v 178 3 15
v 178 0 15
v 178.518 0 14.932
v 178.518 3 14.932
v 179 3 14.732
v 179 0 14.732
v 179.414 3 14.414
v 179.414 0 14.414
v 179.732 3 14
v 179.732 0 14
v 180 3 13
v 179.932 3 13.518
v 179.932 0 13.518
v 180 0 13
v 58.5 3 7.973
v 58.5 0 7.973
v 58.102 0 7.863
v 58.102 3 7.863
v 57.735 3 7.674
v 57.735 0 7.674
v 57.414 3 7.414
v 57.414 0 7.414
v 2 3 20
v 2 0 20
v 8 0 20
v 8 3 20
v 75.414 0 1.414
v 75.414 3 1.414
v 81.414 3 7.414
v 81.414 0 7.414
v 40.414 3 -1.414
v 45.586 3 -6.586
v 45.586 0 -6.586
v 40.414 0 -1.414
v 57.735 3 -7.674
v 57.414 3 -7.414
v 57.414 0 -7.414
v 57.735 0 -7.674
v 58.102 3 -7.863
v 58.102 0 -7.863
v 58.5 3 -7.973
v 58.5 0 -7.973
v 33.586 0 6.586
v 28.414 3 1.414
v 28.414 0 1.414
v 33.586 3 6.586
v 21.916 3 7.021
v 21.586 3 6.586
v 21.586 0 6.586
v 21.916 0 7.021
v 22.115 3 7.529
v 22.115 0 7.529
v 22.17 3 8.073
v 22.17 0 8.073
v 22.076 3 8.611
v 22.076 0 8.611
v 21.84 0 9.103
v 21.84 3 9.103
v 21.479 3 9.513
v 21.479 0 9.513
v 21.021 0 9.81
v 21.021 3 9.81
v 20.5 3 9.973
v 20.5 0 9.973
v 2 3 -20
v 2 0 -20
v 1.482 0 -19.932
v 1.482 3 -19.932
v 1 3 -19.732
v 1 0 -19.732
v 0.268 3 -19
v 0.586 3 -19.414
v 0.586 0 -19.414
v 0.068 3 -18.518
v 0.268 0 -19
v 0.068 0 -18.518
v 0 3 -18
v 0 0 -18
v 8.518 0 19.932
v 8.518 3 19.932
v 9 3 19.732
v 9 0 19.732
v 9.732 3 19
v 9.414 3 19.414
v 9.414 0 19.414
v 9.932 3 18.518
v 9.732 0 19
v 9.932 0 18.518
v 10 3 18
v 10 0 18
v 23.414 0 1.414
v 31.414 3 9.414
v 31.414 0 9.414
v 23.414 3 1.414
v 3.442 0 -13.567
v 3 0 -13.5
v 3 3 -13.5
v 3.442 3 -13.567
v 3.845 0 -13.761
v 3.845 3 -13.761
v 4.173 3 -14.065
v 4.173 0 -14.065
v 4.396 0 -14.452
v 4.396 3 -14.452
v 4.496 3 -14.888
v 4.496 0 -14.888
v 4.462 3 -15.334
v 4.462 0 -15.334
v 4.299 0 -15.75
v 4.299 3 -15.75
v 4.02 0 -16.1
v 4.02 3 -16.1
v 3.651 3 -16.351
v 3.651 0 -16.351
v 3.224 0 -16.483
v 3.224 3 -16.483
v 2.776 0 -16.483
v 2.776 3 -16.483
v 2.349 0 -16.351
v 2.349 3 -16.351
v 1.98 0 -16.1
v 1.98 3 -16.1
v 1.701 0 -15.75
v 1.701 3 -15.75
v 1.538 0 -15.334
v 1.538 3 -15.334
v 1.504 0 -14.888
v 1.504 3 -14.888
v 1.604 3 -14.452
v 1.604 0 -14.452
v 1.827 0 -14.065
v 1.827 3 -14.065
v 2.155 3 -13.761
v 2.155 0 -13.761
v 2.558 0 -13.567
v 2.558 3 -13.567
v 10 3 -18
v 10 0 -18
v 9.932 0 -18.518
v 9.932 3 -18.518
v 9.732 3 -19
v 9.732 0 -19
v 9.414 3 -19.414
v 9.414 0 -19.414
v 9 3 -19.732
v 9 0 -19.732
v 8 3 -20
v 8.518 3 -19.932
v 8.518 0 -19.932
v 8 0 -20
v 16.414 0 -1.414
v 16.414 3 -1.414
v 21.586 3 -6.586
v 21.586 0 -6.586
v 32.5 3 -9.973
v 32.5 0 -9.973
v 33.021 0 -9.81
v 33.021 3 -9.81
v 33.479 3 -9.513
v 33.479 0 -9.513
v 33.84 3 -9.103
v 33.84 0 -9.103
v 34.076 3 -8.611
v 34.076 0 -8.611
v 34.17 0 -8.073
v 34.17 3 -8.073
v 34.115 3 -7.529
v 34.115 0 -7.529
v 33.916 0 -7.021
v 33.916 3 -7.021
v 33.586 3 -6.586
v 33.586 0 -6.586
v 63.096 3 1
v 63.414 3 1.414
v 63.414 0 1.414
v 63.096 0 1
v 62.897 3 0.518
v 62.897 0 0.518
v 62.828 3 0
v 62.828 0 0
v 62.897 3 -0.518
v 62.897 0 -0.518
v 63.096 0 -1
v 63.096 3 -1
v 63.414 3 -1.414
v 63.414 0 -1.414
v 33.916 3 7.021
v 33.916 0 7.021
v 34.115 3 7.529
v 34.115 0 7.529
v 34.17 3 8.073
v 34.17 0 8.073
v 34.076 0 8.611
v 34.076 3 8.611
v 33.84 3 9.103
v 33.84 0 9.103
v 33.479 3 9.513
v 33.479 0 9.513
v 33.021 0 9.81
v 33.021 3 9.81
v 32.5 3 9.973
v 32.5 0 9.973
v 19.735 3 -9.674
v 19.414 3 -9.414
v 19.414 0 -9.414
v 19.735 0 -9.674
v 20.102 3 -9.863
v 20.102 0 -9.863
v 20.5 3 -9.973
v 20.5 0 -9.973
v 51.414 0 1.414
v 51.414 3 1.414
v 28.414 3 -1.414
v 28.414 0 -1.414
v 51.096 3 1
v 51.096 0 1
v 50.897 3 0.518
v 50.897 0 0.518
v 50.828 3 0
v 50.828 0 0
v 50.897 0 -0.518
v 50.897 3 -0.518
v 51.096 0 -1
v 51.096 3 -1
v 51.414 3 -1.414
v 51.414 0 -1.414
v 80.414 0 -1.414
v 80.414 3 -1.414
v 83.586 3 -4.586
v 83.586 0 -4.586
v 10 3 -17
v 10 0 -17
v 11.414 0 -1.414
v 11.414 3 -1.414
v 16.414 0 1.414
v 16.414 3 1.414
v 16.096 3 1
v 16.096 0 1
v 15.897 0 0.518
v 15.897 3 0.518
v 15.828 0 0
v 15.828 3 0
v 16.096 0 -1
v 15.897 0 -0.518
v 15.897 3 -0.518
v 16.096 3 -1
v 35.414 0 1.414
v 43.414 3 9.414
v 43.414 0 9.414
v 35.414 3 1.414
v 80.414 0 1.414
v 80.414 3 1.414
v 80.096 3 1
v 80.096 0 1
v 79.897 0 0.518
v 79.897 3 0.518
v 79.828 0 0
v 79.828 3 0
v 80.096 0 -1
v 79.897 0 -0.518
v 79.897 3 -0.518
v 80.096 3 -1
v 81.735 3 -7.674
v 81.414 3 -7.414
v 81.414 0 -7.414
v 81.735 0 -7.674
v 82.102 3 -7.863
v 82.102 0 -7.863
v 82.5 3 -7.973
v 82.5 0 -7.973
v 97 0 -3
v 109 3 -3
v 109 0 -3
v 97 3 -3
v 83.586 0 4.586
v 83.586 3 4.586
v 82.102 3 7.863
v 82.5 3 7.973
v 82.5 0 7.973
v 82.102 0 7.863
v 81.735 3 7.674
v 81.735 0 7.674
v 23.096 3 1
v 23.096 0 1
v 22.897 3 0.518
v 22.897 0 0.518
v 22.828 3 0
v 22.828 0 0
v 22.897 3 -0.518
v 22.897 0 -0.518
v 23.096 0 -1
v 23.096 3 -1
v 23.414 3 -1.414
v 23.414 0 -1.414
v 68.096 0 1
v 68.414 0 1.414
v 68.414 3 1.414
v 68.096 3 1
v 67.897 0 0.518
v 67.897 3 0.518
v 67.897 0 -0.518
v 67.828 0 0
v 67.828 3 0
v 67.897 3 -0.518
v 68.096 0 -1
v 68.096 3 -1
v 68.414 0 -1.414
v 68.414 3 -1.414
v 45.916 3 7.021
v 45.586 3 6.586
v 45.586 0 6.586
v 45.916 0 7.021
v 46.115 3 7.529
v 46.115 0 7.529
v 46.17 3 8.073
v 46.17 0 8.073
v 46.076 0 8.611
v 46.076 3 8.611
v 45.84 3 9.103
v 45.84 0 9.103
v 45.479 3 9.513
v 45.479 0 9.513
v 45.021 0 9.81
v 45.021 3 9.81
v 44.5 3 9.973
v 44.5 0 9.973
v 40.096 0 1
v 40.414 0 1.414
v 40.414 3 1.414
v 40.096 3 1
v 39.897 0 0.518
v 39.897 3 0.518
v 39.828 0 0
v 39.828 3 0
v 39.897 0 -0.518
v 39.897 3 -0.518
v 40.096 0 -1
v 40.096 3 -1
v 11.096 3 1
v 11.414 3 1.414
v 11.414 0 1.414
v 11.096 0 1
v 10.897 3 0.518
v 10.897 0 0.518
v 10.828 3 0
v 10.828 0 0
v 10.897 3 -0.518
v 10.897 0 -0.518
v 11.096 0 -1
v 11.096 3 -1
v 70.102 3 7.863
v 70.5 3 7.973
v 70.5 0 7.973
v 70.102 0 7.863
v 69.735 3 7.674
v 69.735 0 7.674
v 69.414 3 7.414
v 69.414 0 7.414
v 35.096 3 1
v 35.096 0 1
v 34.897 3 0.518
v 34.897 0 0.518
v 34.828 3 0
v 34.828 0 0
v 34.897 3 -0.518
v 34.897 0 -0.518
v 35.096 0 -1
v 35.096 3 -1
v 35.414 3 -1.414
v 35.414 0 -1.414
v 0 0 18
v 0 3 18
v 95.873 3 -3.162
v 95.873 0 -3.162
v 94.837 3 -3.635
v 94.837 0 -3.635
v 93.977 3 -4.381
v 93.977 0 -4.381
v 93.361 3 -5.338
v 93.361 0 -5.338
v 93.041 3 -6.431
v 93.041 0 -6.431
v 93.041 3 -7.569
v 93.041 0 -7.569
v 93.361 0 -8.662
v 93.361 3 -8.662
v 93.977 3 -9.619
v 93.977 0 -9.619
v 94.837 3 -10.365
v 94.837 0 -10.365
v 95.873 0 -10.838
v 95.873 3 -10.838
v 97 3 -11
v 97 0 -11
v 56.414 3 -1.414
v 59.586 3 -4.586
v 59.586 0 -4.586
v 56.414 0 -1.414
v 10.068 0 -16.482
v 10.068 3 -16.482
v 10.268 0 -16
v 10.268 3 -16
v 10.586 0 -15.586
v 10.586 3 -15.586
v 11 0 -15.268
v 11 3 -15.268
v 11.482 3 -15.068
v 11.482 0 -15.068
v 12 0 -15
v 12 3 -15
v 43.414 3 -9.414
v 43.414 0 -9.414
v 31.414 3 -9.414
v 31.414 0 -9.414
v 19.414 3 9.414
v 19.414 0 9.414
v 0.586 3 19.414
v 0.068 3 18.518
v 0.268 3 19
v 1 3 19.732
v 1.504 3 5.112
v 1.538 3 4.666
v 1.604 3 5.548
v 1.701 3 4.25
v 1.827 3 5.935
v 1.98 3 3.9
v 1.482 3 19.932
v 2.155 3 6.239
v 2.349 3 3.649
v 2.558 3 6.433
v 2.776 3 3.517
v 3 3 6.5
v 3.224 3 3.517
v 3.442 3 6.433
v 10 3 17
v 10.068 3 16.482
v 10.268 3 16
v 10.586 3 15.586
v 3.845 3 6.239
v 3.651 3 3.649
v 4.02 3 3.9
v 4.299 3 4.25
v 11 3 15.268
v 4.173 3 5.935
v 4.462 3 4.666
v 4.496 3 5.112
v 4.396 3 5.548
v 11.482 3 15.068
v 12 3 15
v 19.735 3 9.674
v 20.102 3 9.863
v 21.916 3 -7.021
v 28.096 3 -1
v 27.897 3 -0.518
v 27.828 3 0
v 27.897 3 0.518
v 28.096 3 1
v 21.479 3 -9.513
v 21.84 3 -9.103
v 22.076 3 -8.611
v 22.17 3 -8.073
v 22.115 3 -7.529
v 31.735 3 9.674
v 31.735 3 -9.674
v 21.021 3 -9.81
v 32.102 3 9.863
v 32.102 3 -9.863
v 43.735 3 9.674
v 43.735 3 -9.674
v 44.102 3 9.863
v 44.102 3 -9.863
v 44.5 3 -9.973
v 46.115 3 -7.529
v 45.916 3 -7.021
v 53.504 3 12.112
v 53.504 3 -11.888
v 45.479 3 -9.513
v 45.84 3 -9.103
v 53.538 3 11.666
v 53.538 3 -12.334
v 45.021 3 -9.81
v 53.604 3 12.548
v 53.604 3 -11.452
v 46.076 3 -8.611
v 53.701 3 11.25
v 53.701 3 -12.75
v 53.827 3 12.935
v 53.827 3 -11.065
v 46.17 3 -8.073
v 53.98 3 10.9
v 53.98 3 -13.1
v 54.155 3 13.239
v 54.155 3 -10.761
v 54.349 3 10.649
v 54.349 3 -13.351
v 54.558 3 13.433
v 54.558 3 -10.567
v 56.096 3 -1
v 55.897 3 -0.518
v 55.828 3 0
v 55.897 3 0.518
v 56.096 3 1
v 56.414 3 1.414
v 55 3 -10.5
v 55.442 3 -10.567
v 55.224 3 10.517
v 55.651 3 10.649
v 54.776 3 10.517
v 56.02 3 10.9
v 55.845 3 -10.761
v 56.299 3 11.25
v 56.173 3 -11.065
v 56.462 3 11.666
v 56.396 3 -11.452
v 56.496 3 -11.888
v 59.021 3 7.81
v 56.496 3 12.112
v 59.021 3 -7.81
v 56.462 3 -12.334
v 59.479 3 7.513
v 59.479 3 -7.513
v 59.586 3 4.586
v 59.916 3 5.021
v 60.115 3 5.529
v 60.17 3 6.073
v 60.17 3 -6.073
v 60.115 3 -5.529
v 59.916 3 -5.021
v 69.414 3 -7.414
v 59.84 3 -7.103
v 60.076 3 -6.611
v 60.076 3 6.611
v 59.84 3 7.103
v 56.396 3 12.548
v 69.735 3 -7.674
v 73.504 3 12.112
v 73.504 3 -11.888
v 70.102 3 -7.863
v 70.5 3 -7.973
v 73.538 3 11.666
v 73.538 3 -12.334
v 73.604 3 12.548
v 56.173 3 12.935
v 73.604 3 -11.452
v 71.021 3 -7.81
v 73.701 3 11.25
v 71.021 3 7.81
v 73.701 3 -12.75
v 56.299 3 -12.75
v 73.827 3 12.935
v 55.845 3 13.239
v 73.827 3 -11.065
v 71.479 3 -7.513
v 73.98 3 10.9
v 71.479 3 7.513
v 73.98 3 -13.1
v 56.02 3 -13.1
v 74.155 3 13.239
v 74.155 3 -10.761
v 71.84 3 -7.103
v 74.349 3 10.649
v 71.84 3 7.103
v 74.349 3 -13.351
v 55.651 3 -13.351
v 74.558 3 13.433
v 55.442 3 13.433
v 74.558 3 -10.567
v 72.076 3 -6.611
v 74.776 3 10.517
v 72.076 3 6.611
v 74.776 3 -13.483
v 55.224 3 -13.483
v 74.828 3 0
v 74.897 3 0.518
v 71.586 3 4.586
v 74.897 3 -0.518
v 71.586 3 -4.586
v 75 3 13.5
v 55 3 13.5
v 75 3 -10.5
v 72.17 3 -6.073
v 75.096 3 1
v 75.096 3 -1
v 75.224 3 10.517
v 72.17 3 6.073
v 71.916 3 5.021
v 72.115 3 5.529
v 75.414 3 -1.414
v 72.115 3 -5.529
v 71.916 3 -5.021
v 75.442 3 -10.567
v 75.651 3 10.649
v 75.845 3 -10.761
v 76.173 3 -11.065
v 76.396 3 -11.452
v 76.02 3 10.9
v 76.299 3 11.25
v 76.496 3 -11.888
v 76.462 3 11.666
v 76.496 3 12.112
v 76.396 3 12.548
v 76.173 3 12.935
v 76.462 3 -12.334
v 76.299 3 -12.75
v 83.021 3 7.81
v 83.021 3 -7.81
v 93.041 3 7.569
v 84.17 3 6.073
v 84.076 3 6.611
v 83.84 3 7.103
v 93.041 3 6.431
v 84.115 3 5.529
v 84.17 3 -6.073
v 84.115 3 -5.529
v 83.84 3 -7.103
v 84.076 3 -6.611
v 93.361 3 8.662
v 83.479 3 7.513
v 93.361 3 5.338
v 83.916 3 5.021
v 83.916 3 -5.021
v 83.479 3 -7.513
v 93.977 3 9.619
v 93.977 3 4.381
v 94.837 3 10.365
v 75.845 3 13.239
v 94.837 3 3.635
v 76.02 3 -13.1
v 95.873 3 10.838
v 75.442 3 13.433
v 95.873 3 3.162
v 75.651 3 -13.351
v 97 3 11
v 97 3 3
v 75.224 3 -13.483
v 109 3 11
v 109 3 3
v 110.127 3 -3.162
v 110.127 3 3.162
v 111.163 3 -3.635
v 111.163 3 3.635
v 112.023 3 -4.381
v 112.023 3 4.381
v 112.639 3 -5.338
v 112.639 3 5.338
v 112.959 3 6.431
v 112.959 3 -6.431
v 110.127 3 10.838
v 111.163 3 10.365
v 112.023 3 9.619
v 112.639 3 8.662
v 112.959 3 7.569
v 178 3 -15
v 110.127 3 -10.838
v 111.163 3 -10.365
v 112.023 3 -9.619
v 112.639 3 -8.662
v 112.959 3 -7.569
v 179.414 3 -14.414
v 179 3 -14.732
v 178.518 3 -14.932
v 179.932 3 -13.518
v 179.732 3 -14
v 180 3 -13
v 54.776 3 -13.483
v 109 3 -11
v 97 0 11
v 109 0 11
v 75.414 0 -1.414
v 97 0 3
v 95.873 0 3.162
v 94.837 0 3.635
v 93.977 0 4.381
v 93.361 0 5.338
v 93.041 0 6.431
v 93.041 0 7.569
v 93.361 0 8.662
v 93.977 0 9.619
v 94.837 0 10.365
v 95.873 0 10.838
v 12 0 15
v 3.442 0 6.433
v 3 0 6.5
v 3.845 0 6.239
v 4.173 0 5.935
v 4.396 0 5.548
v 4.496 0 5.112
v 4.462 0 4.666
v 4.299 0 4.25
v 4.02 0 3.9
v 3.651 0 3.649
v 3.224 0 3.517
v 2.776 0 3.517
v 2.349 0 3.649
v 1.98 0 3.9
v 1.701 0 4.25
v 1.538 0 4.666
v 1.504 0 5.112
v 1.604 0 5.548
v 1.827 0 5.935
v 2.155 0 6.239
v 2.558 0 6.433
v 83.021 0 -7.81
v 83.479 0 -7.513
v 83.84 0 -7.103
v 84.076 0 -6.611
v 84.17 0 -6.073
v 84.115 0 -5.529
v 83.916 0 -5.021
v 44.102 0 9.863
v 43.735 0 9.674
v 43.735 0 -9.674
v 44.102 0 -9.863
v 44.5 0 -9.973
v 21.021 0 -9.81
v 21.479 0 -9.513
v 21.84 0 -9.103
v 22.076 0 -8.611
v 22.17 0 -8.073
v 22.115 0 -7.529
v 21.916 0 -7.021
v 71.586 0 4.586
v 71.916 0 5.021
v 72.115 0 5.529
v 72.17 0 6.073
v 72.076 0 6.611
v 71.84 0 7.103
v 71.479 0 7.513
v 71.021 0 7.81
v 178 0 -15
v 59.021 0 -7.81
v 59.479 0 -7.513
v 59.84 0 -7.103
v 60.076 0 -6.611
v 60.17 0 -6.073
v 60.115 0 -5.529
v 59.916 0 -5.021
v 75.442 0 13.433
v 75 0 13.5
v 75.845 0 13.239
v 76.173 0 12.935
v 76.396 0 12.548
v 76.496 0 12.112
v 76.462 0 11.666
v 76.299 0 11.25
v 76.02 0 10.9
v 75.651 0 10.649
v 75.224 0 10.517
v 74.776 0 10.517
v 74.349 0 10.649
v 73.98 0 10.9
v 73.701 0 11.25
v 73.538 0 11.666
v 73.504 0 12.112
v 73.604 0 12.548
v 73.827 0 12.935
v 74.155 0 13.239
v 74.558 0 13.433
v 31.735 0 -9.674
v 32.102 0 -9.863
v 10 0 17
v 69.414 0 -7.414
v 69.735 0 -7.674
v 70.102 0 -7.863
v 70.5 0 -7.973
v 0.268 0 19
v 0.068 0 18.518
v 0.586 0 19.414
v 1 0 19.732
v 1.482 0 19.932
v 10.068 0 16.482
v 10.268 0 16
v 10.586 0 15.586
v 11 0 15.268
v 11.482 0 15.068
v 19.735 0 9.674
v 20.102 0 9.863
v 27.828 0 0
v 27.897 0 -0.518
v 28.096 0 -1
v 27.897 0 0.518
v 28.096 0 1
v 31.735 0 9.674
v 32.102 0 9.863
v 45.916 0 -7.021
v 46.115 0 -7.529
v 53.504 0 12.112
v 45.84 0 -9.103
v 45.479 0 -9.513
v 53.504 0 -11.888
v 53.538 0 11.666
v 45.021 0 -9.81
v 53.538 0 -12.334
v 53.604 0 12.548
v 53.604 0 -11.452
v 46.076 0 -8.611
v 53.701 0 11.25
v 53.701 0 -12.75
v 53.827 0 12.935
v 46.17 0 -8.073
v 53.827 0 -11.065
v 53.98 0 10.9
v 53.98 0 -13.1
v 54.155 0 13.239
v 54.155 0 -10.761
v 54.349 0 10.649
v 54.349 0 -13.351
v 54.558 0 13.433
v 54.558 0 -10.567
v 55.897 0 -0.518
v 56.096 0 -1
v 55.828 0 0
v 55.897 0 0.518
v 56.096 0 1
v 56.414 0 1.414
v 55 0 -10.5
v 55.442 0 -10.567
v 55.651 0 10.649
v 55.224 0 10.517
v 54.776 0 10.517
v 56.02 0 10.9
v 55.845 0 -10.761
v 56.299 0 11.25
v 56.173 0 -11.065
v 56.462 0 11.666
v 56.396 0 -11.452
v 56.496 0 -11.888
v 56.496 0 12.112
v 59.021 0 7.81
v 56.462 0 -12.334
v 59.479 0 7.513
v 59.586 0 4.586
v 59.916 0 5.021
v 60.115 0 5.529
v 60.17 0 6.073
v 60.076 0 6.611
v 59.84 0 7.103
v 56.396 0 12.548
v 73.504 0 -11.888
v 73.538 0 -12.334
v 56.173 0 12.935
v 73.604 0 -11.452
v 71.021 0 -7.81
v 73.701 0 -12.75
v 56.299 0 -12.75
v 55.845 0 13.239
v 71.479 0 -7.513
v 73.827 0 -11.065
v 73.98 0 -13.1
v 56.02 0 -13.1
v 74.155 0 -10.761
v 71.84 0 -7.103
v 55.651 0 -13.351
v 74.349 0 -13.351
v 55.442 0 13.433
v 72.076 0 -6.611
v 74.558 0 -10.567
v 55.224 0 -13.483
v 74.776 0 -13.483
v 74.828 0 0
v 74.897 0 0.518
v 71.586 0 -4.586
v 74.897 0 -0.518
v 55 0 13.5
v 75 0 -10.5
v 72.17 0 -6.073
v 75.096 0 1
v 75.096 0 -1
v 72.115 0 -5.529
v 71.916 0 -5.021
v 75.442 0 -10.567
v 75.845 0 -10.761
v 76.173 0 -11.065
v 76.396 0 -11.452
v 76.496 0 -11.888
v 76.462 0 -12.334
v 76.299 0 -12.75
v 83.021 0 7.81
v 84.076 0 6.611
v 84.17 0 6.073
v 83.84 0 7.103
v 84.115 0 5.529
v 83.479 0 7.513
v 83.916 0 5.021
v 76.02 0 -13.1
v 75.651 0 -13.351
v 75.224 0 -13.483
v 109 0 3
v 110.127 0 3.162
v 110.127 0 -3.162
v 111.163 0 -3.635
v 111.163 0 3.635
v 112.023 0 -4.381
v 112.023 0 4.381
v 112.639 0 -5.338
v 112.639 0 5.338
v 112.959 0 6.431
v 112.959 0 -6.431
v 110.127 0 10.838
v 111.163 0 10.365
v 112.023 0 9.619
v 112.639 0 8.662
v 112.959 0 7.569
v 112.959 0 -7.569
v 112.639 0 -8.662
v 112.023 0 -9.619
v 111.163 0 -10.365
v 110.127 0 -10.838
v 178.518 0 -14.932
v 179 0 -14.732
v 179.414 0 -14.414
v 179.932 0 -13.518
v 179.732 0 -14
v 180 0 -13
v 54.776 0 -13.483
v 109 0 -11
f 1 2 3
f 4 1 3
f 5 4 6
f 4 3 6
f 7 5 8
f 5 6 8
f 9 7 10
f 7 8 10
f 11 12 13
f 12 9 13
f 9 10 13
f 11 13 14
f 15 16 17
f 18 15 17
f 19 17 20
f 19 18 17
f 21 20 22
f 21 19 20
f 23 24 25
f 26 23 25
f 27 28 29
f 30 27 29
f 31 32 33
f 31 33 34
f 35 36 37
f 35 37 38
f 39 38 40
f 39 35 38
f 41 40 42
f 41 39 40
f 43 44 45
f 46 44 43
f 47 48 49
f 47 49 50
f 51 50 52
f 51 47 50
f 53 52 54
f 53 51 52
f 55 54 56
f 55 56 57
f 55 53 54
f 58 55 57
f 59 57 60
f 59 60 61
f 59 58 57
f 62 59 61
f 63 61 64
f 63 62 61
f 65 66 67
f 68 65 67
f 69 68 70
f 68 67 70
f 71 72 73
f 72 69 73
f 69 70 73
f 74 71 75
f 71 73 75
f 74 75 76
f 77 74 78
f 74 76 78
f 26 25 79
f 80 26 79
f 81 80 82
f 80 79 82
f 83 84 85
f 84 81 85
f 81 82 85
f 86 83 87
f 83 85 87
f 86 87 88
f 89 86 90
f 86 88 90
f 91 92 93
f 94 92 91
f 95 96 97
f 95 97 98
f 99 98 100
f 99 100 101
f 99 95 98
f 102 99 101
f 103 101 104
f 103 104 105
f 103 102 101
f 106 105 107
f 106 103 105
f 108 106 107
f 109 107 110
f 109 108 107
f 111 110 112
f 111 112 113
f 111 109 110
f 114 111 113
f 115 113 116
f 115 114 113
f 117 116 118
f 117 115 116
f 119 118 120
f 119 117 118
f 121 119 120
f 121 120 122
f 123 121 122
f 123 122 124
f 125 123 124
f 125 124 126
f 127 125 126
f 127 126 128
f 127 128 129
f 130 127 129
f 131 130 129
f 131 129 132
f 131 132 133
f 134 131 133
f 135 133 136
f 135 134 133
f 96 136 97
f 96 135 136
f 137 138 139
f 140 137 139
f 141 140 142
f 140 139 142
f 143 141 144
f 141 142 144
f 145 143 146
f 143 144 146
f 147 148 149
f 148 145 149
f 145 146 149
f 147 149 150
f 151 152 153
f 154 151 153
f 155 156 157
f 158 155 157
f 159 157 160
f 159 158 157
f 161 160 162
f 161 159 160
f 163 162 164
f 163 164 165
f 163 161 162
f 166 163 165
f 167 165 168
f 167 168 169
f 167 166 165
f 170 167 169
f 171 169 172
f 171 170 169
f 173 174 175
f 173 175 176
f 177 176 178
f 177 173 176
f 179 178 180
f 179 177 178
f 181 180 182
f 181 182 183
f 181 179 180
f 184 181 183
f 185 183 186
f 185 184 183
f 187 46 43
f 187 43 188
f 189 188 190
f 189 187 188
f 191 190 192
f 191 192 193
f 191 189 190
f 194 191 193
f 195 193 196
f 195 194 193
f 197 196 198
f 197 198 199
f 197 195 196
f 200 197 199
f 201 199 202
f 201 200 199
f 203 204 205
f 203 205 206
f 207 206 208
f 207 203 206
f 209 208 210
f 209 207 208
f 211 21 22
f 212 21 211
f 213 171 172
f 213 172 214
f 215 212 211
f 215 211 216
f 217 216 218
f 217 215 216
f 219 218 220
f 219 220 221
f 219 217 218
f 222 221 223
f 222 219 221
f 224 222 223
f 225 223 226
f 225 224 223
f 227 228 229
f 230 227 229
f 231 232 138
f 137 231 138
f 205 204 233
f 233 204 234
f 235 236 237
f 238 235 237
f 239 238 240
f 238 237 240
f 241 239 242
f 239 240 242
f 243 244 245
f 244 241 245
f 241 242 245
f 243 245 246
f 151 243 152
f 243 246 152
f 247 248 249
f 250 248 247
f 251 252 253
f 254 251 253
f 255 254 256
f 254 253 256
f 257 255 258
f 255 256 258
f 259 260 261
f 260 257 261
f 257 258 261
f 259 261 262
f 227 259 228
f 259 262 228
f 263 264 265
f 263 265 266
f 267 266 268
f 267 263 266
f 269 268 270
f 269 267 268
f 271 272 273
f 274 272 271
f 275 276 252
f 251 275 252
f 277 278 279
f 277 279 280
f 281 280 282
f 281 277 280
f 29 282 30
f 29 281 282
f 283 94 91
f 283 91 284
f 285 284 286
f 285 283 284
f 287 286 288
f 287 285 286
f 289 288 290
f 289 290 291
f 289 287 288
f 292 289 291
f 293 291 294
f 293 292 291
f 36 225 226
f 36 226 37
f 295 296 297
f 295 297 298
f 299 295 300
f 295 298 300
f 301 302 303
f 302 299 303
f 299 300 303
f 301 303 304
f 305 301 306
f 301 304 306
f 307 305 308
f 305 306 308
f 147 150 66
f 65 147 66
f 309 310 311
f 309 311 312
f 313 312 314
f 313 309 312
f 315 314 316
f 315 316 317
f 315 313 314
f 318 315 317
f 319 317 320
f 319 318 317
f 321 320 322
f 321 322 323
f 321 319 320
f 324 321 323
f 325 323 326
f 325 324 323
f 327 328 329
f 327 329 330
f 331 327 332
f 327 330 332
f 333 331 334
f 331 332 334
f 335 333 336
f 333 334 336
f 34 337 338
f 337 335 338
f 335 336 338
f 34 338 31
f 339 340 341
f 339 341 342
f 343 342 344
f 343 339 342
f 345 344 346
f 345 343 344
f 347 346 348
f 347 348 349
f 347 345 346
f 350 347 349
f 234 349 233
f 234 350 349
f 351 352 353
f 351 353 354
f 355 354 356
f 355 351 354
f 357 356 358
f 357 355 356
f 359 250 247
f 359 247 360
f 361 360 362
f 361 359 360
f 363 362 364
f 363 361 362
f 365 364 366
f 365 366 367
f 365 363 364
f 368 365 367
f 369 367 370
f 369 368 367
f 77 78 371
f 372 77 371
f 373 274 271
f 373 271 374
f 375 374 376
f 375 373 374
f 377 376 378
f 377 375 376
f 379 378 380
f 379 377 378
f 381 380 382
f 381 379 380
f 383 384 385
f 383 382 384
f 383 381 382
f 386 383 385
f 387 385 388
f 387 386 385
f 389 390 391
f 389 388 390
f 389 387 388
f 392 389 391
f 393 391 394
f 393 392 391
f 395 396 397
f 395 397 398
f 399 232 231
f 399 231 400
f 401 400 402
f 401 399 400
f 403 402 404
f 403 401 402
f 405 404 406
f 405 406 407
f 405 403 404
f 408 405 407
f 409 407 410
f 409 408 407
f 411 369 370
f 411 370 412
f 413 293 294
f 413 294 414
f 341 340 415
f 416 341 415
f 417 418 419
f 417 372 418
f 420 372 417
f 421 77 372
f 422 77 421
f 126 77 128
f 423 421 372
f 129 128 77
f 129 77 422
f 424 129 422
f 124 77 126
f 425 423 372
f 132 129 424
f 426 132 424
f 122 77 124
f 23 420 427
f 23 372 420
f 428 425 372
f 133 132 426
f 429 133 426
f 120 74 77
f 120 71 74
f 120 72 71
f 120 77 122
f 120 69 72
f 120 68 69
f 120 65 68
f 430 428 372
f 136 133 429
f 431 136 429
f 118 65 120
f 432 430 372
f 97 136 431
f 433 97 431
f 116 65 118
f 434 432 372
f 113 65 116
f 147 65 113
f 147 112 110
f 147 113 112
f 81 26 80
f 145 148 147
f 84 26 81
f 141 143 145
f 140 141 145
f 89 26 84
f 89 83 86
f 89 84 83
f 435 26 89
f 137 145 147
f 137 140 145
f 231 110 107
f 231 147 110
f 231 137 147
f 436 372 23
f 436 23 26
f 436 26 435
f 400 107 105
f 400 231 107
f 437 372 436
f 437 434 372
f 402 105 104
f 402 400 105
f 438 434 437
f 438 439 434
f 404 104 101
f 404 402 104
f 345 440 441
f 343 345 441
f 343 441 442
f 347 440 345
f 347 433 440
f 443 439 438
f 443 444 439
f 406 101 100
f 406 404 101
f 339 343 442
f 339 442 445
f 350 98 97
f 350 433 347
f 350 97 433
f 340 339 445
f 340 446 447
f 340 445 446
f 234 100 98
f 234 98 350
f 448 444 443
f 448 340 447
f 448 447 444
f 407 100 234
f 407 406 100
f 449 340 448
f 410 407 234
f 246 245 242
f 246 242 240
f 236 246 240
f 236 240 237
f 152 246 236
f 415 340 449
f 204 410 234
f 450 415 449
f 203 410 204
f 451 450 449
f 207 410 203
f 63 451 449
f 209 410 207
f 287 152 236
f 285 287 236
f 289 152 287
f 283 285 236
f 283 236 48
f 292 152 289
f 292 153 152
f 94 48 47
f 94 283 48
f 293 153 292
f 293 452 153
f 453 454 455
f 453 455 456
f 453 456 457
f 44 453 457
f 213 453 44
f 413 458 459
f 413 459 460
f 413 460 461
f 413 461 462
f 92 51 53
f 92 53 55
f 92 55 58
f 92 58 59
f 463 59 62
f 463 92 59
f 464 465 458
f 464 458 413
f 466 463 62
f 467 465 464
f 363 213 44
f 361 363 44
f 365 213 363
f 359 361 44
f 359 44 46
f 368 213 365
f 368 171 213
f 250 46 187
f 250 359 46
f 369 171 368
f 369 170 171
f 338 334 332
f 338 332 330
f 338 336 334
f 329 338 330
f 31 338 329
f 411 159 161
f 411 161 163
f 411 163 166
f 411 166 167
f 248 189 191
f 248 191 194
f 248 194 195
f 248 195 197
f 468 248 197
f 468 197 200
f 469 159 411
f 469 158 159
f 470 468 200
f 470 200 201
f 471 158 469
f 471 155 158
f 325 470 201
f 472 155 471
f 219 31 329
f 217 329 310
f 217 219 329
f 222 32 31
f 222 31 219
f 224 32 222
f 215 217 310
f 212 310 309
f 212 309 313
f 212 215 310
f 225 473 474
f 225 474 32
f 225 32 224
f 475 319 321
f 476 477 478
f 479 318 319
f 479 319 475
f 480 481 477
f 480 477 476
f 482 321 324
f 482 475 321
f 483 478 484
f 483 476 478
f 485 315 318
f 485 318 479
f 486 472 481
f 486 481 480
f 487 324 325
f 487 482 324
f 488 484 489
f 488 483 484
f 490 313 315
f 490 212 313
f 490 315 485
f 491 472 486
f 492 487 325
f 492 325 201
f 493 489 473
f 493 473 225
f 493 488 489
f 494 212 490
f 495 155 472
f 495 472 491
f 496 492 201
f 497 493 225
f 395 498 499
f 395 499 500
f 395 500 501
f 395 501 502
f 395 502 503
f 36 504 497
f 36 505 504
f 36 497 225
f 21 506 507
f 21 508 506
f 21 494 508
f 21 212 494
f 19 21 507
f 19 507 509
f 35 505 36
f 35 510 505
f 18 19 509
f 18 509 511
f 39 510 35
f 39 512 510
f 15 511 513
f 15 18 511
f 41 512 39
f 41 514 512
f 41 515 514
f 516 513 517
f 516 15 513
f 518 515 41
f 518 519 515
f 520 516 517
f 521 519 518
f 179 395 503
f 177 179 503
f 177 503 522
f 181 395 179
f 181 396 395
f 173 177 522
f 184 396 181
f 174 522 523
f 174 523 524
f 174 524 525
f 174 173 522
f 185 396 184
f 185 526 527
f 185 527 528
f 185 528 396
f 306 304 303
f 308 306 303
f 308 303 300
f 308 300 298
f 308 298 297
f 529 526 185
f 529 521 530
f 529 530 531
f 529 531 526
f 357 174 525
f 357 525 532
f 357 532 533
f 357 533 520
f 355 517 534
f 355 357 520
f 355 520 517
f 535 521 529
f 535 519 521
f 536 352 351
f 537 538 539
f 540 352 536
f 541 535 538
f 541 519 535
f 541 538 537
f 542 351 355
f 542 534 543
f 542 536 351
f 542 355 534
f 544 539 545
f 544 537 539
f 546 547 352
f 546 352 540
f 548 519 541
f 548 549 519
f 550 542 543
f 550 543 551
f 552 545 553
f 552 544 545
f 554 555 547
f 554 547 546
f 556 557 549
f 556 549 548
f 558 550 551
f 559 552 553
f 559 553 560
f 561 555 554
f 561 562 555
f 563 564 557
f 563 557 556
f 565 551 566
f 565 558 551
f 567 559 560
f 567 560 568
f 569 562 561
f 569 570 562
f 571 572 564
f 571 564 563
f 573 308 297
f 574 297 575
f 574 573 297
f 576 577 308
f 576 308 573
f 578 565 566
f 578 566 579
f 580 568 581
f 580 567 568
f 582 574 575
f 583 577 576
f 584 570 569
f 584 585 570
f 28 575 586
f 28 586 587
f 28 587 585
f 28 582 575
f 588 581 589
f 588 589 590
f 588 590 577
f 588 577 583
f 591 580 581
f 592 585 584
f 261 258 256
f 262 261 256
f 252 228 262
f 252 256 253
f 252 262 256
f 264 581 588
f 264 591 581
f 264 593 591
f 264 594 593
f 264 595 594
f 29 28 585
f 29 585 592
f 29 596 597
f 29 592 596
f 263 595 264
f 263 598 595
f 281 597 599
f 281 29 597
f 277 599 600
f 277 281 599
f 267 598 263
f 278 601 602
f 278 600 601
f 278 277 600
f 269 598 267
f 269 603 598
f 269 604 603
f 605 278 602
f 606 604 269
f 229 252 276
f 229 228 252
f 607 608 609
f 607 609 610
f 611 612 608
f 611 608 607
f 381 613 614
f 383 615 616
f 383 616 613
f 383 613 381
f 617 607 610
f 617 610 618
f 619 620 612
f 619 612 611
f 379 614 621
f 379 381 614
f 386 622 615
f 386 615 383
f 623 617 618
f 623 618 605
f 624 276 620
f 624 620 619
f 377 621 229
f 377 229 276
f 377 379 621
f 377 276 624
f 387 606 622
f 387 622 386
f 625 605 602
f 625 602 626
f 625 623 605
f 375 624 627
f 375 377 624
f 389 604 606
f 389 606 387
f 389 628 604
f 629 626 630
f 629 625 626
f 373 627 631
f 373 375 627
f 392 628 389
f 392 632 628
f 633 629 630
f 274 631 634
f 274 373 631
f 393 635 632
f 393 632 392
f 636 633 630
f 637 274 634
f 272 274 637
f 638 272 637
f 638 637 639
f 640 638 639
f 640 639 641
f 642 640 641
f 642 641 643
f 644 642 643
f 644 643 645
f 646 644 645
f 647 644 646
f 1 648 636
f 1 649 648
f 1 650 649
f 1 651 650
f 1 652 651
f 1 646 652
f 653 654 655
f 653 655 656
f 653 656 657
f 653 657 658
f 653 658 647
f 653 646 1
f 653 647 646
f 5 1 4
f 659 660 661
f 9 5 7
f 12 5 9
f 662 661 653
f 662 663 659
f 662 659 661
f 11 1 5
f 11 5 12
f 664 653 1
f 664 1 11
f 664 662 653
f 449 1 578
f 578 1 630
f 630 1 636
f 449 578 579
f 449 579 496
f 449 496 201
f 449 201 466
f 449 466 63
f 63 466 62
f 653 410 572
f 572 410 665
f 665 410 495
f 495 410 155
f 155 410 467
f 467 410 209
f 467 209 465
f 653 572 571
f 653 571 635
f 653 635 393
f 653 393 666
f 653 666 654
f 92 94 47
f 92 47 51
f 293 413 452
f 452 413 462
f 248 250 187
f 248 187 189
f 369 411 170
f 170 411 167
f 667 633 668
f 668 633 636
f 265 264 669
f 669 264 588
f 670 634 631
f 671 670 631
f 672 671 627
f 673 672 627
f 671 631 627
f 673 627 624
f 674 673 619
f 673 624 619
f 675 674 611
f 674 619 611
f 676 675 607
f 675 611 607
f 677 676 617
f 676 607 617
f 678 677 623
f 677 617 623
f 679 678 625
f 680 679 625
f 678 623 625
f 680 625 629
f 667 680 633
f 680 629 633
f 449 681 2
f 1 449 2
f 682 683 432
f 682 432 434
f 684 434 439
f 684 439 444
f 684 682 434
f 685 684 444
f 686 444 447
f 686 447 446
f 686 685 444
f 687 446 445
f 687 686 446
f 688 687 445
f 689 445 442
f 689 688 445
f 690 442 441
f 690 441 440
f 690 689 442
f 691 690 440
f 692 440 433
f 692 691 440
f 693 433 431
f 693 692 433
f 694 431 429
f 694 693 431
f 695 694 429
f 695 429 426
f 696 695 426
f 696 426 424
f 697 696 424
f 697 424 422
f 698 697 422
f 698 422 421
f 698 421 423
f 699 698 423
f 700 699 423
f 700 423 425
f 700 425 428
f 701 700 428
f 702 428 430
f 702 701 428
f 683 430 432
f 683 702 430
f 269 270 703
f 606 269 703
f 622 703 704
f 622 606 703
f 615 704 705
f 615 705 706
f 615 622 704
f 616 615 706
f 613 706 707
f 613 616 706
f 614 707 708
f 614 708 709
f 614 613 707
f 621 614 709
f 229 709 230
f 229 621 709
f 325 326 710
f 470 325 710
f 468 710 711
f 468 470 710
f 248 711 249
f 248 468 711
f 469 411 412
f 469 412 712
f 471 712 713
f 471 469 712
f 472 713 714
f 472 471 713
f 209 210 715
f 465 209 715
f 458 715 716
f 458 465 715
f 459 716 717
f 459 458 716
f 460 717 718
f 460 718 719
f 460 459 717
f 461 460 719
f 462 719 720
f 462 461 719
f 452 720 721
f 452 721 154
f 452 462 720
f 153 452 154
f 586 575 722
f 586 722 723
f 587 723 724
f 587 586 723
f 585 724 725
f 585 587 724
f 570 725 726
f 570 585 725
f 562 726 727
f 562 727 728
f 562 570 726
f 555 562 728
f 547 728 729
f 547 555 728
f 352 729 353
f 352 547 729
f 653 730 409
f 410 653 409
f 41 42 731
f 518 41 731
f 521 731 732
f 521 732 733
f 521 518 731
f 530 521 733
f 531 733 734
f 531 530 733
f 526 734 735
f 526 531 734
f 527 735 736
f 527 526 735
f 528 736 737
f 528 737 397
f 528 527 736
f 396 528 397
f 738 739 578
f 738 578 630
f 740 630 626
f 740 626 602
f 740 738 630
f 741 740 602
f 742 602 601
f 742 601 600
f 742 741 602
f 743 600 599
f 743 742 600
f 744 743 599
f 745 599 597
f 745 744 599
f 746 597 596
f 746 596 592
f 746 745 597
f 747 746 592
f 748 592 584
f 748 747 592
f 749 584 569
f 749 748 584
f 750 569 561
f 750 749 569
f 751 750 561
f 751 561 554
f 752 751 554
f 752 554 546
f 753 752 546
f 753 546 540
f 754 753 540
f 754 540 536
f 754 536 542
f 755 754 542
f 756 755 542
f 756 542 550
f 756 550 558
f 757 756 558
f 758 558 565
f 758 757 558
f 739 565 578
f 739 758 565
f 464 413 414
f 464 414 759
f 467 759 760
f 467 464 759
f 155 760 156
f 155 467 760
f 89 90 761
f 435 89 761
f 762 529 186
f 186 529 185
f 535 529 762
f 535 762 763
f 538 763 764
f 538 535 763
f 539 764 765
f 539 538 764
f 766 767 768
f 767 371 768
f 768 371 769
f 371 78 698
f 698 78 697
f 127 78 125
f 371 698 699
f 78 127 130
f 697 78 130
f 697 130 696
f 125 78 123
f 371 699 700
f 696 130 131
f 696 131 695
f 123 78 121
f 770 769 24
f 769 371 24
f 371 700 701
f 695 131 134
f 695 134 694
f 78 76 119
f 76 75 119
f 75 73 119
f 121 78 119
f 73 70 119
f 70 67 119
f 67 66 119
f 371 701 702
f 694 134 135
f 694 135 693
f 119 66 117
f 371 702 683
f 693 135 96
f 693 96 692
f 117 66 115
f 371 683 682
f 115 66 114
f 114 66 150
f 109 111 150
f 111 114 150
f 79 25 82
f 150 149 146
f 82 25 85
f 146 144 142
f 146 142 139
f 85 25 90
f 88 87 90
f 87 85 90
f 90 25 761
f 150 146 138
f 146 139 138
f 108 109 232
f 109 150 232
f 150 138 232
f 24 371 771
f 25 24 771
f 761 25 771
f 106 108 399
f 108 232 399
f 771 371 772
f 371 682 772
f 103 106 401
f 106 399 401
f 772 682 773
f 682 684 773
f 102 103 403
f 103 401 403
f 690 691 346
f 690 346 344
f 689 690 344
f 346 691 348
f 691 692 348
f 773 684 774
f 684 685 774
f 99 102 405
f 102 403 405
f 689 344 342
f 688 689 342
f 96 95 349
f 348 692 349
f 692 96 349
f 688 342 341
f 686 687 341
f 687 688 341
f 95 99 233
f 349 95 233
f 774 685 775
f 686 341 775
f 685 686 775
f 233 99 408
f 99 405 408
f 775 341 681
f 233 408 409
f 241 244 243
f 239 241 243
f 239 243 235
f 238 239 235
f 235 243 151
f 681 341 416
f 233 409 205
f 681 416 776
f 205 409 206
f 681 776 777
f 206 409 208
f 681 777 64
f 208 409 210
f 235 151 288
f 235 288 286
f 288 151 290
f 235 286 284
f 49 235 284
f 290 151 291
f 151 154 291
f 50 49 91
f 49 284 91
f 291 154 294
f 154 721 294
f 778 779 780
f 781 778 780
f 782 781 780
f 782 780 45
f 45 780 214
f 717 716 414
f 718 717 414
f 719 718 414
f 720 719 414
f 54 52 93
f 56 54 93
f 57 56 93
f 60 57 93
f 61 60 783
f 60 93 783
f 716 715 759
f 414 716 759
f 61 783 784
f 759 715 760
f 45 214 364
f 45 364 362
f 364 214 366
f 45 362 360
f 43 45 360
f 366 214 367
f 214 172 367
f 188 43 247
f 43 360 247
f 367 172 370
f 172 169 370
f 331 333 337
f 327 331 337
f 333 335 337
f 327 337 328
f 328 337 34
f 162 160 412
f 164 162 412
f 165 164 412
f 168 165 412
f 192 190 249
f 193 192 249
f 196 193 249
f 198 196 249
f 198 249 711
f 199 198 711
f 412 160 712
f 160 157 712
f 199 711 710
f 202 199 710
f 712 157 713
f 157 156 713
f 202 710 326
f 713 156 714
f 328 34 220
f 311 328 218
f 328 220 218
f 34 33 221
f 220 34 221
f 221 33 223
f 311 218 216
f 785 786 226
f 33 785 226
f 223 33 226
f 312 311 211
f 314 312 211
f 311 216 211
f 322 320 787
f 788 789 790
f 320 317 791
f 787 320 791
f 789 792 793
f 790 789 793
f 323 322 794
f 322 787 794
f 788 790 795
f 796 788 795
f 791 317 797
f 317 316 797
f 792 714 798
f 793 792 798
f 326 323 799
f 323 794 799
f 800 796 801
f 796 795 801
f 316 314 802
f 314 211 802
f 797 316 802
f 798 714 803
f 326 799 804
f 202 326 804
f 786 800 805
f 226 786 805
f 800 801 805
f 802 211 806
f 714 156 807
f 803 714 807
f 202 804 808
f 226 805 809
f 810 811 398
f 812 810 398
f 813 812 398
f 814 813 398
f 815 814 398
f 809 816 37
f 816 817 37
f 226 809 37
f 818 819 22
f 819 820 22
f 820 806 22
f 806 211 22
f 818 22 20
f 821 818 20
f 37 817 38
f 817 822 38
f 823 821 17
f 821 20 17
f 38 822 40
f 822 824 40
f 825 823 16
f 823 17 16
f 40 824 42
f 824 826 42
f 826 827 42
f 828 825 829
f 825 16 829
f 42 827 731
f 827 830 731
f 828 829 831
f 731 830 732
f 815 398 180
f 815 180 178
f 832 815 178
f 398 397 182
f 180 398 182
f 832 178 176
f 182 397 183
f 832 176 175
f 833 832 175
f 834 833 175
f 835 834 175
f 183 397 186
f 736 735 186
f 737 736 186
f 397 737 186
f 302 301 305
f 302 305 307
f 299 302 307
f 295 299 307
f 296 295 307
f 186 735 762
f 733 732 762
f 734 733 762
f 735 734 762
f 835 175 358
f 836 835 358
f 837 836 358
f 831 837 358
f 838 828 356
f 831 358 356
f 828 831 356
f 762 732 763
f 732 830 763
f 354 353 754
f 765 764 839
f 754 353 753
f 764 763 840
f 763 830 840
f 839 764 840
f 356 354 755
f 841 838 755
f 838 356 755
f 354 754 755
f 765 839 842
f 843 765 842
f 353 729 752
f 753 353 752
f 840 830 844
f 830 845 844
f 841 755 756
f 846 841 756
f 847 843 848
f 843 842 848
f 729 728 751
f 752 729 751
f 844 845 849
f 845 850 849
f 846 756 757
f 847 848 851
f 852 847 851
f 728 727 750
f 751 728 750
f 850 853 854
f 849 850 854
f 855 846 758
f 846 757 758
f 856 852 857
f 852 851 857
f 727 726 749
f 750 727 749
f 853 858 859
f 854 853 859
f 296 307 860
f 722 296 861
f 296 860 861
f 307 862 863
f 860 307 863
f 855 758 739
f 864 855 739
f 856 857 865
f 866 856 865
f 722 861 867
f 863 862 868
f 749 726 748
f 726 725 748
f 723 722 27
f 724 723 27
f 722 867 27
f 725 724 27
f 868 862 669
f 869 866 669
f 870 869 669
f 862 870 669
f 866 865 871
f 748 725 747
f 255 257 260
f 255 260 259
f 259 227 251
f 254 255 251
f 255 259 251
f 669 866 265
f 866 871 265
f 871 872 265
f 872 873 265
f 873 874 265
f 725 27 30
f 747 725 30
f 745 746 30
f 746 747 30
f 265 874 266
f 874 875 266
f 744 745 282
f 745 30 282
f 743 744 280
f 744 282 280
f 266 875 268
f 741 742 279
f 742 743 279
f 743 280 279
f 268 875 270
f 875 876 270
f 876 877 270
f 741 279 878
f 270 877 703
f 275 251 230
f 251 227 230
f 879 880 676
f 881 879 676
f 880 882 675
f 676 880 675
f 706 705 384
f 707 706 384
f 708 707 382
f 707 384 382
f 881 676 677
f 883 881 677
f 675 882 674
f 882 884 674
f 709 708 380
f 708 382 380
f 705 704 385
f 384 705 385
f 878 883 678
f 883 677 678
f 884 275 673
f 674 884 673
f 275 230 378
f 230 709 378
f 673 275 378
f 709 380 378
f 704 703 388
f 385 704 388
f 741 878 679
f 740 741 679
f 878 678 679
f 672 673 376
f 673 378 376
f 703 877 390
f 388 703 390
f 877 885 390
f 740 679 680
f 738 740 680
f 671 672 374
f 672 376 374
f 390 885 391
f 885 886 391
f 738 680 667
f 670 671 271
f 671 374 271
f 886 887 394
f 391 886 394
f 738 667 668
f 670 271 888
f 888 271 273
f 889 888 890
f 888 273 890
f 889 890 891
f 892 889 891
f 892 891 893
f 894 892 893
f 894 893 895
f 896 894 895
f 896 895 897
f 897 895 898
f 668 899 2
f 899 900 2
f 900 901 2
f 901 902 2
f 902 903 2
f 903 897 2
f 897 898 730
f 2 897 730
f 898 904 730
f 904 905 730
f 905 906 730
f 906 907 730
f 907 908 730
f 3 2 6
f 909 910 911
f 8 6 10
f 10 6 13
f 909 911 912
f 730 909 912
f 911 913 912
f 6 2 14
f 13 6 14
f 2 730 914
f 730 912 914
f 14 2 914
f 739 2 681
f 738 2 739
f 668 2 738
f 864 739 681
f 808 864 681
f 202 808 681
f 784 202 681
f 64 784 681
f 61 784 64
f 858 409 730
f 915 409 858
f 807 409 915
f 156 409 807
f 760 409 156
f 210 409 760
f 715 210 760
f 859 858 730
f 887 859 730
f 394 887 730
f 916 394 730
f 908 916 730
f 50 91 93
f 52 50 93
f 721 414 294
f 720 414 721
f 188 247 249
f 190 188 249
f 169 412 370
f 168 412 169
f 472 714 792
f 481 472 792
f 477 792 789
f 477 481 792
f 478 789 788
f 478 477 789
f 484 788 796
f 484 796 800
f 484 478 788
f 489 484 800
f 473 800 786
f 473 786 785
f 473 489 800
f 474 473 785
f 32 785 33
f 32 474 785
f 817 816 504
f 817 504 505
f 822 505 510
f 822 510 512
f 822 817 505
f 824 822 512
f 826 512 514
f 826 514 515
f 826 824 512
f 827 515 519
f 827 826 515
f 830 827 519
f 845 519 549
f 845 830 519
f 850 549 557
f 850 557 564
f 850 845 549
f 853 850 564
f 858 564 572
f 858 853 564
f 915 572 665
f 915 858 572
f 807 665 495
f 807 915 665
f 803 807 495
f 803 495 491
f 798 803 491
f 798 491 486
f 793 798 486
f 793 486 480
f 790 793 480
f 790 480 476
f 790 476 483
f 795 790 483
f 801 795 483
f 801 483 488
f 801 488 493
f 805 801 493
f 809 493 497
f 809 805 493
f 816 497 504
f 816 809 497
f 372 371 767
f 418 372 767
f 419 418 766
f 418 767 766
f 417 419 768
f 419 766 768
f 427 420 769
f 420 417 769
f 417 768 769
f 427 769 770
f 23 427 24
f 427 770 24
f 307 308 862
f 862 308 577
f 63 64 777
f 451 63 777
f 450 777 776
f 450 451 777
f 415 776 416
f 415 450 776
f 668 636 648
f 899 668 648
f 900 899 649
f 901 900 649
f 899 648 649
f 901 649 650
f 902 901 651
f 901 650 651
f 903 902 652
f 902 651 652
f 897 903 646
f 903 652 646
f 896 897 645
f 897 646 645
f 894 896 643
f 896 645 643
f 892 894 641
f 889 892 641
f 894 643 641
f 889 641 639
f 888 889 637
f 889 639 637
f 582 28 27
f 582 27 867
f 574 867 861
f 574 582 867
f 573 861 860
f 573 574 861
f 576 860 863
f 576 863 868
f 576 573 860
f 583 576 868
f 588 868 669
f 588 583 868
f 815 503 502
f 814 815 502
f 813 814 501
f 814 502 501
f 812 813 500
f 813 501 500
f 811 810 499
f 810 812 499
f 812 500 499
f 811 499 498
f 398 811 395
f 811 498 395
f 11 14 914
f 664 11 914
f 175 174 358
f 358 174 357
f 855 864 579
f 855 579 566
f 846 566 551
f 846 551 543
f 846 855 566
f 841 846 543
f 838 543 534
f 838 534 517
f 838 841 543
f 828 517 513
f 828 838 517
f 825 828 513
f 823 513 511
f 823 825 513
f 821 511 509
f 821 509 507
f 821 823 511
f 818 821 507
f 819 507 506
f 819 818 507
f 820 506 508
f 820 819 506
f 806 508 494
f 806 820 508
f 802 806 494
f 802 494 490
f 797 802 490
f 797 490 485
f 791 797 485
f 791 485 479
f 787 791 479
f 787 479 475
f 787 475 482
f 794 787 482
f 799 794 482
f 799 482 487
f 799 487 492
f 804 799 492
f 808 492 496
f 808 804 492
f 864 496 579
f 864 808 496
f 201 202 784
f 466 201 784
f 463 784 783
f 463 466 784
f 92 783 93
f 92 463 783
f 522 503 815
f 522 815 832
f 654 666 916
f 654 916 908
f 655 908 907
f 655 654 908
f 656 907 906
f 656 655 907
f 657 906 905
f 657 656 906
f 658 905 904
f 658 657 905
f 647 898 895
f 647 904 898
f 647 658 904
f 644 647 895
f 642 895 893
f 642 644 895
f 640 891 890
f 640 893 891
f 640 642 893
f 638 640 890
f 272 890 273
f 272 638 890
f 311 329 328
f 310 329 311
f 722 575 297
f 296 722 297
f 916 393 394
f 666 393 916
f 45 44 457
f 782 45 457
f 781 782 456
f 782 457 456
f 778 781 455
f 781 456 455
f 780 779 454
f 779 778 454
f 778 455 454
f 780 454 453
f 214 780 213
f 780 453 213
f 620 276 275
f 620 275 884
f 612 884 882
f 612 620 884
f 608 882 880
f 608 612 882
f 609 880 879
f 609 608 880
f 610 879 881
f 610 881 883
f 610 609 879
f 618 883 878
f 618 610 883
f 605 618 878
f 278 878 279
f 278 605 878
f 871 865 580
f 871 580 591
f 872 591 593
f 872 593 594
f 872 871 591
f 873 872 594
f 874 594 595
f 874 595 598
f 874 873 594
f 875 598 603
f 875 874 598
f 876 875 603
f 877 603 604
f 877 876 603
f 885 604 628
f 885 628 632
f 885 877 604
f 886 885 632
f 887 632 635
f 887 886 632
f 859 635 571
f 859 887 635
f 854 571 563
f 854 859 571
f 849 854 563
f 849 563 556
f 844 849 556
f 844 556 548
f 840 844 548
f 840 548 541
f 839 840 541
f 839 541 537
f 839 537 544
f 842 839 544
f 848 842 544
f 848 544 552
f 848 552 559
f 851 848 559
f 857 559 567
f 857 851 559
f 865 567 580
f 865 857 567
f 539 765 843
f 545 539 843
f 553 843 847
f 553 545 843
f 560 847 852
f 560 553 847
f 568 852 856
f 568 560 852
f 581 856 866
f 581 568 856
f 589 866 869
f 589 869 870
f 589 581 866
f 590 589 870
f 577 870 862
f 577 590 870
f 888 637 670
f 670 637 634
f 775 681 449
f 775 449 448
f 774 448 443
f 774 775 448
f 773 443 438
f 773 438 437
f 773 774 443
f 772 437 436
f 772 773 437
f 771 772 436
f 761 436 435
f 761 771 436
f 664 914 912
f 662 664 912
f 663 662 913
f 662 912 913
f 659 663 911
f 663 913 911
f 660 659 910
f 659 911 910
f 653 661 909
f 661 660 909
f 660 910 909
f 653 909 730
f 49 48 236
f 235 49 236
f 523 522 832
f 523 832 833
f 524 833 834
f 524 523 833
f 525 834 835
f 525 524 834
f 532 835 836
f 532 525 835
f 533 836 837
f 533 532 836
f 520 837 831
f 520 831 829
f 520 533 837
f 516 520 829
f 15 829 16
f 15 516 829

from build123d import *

# Parameters (mm, degrees)
SKETCH_1_R          = 1.5
EXTRUDE_1_DEPTH     = 3
CUT_EXTRUDE_1_DEPTH = 182.132548152
FILLET_1_R          = 2


with BuildPart() as part:
    # 草图1 → 凸台-拉伸1 (new body)
    with BuildSketch(Plane(origin=(0, 0, 0), x_dir=(1, 0, 0), z_dir=(0, 1, 0))):
        Polygon((10, -15), (180, -15), (180, 15), (10, 15), (10, 20), (0, 20), (0, -20), (10, -20), align=None)
        with Locations(Location((55, -12, 0), (0, 0, 270))):
            Circle(SKETCH_1_R, mode=Mode.SUBTRACT)
        with Locations(Location((75, -12, 0), (0, 0, 270))):
            Circle(SKETCH_1_R, mode=Mode.SUBTRACT)
        with Locations(Location((3, 15, 0), (0, 0, 270))):
            Circle(SKETCH_1_R, mode=Mode.SUBTRACT)
        with Locations(Location((3, -5, 0), (0, 0, 270))):
            Circle(SKETCH_1_R, mode=Mode.SUBTRACT)
        with Locations(Location((75, 12, 0), (0, 0, 270))):
            Circle(SKETCH_1_R, mode=Mode.SUBTRACT)
        with Locations(Location((55, 12, 0), (0, 0, 270))):
            Circle(SKETCH_1_R, mode=Mode.SUBTRACT)
    extrude(amount=EXTRUDE_1_DEPTH)

    # 草图2 → 切除-拉伸1 (cut, through all)
    with BuildSketch(Plane(origin=(0, 3, 0), x_dir=(1, 0, 0), z_dir=(0, 1, 0))):
        Polygon((20, 10), (10, 0), (20, -10), (25, -10), (15, 0), (25, 10), align=None)
        Polygon((32, -10), (22, 0), (32, 10), (37, 10), (27, 0), (37, -10), align=None)
        Polygon((44, -10), (34, 0), (44, 10), (49, 10), (39, 0), (49, -10), align=None)
        Polygon((50, 0), (58, 8), (63, 8), (55, 0), (63, -8), (58, -8), align=None)
        Polygon((75, -8), (67, 0), (75, 8), (70, 8), (62, 0), (70, -8), align=None)
        Polygon((87, -8), (79, 0), (87, 8), (82, 8), (74, 0), (82, -8), align=None)
        with BuildLine():
            Line((97, 11), (109, 11))
            ThreePointArc((109, 11), (113, 7), (109, 3))
            Line((109, 3), (97, 3))
            ThreePointArc((97, 3), (93, 7), (97, 11))
        make_face()
        with BuildLine():
            Line((97, -11), (109, -11))
            ThreePointArc((109, -11), (113, -7), (109, -3))
            Line((109, -3), (97, -3))
            ThreePointArc((97, -3), (93, -7), (97, -11))
        make_face()
    extrude(amount=-CUT_EXTRUDE_1_DEPTH, mode=Mode.SUBTRACT)

    # 圆角1
    # the kernel refuses this fillet: 2 mm, written as the material it adds along each edge
    with BuildSketch(Plane(origin=(10, 0, -15), x_dir=(1, 0, 0), z_dir=(0, 1, 0)), Plane(origin=(10, 3, 0), x_dir=(0.7071067811865515, 0, -0.7071067811865436), z_dir=(0, -1, 0)), Plane(origin=(34, 3, 0), x_dir=(0.7071067811865507, 0, -0.7071067811865445), z_dir=(0, -1, 0)), Plane(origin=(22, 3, 0), x_dir=(0.7071067811865511, 0, -0.7071067811865441), z_dir=(0, -1, 0)), Plane(origin=(62, 3, 0), x_dir=(0.7071067811865536, 0, -0.7071067811865415), z_dir=(0, -1, 0)), Plane(origin=(74, 3, 0), x_dir=(0.7071067811865546, 0, -0.7071067811865407), z_dir=(0, -1, 0))) as fillet_1_piece_1:
        with BuildLine():
            CenterArc((FILLET_1_R, FILLET_1_R), FILLET_1_R, 180, 90)
            Line((0, FILLET_1_R), (0, 0))
            Line((0, 0), (FILLET_1_R, 0))
        make_face()
    extrude(amount=3)
    with BuildSketch(Plane(origin=(10, 0, 15), x_dir=(1, 0, 0), z_dir=(0, 1, 0)), Plane(origin=(50, 3, 0), x_dir=(0.7071067811865553, 0, 0.7071067811865399), z_dir=(0, -1, 0))) as fillet_1_piece_2:
        with BuildLine():
            CenterArc((FILLET_1_R, -FILLET_1_R), FILLET_1_R, 90, 90)
            Line((0, -FILLET_1_R), (0, 0))
            Line((0, 0), (FILLET_1_R, 0))
        make_face()
    extrude(amount=3)
    with BuildSketch(Plane(origin=(20, 3, -10), x_dir=(-0.7071067811865507, 0, 0.7071067811865442), z_dir=(0, -1, 0)), Plane(origin=(44, 3, 10), x_dir=(1, 0, 0), z_dir=(0, -1, 0)), Plane(origin=(32, 3, 10), x_dir=(1, 0, 0), z_dir=(0, -1, 0))) as fillet_1_piece_3:
        with BuildLine():
            CenterArc((FILLET_1_R * 0.414213562373, -FILLET_1_R), FILLET_1_R, 90, 45)
            Line((-FILLET_1_R * 0.292893218813, -FILLET_1_R * 0.292893218813), (0, 0))
            Line((0, 0), (FILLET_1_R * 0.414213562373, 0))
        make_face()
    extrude(amount=3)
    with BuildSketch(Plane(origin=(20, 3, 10), x_dir=(-0.7071067811865507, 0, -0.7071067811865442), z_dir=(0, -1, 0)), Plane(origin=(44, 3, -10), x_dir=(1, 0, 0), z_dir=(0, -1, 0)), Plane(origin=(32, 3, -10), x_dir=(1, 0, 0), z_dir=(0, -1, 0)), Plane(origin=(70, 3, -8), x_dir=(1, 0, 0), z_dir=(0, -1, 0)), Plane(origin=(70, 3, 8), x_dir=(-0.707106781186555, 0, -0.70710678118654), z_dir=(0, -1, 0)), Plane(origin=(58, 3, 8), x_dir=(-0.7071067811865513, 0, -0.7071067811865438), z_dir=(0, -1, 0)), Plane(origin=(82, 3, -8), x_dir=(1, 0, 0), z_dir=(0, -1, 0)), Plane(origin=(82, 3, 8), x_dir=(-0.7071067811865583, 0, -0.7071067811865369), z_dir=(0, -1, 0)), Plane(origin=(58, 3, -8), x_dir=(1, 0, 0), z_dir=(0, -1, 0))) as fillet_1_piece_4:
        with BuildLine():
            CenterArc((FILLET_1_R * 0.414213562373, FILLET_1_R), FILLET_1_R, 225, 45)
            Line((-FILLET_1_R * 0.292893218813, FILLET_1_R * 0.292893218813), (0, 0))
            Line((0, 0), (FILLET_1_R * 0.414213562373, 0))
        make_face()
    extrude(amount=3)
    with BuildSketch(Plane(origin=(25, 3, 10), x_dir=(-1, 0, 0), z_dir=(0, -1, 0)), Plane(origin=(25, 3, -10), x_dir=(-0.7071067811865513, 0, 0.7071067811865436), z_dir=(0, -1, 0)), Plane(origin=(49, 3, 10), x_dir=(-1, 0, 0), z_dir=(0, -1, 0)), Plane(origin=(49, 3, -10), x_dir=(-0.7071067811865511, 0, 0.7071067811865439), z_dir=(0, -1, 0)), Plane(origin=(37, 3, 10), x_dir=(-1, 0, 0), z_dir=(0, -1, 0)), Plane(origin=(37, 3, -10), x_dir=(-0.707106781186551, 0, 0.707106781186544), z_dir=(0, -1, 0)), Plane(origin=(75, 3, -8), x_dir=(-0.7071067811865541, 0, 0.7071067811865409), z_dir=(0, -1, 0)), Plane(origin=(63, 3, -8), x_dir=(-0.7071067811865546, 0, 0.7071067811865406), z_dir=(0, -1, 0)), Plane(origin=(63, 3, 8), x_dir=(-1, 0, 0), z_dir=(0, -1, 0)), Plane(origin=(87, 3, -8), x_dir=(-0.7071067811865531, 0, 0.7071067811865421), z_dir=(0, -1, 0))) as fillet_1_piece_5:
        with BuildLine():
            CenterArc((FILLET_1_R * 2.41421356237, FILLET_1_R), FILLET_1_R, 135, 135)
            Line((FILLET_1_R * 1.70710678119, FILLET_1_R * 1.70710678119), (0, 0))
            Line((0, 0), (FILLET_1_R * 2.41421356237, 0))
        make_face()
    extrude(amount=3)
    with BuildSketch(Plane(origin=(75, 3, 8), x_dir=(-0.7071067811865545, 0, -0.7071067811865405), z_dir=(0, -1, 0)), Plane(origin=(87, 3, 8), x_dir=(-0.7071067811865538, 0, -0.7071067811865415), z_dir=(0, -1, 0))) as fillet_1_piece_6:
        with BuildLine():
            CenterArc((FILLET_1_R * 2.41421356237, -FILLET_1_R), FILLET_1_R, 90, 135)
            Line((FILLET_1_R * 1.70710678119, -FILLET_1_R * 1.70710678119), (0, 0))
            Line((0, 0), (FILLET_1_R * 2.41421356237, 0))
        make_face()
    extrude(amount=3)
    # the kernel refuses this fillet: 2 mm, written as the material it takes off along each edge
    with BuildSketch(Plane(origin=(10, -5, -20), x_dir=(0, 0, 1), z_dir=(0, 1, 0)), Plane(origin=(180, -5, -15), x_dir=(0, 0, 1), z_dir=(0, 1, 0)), Plane(origin=(180, -5, 15), x_dir=(-1, 0, 0), z_dir=(0, 1, 0)), Plane(origin=(15, 8, 0), x_dir=(0.7071067811865511, 0, 0.707106781186544), z_dir=(0, -1, 0)), Plane(origin=(39, 8, 0), x_dir=(0.7071067811865508, 0, 0.7071067811865444), z_dir=(0, -1, 0)), Plane(origin=(27, 8, 0), x_dir=(0.7071067811865503, 0, 0.7071067811865448), z_dir=(0, -1, 0)), Plane(origin=(67, 8, 0), x_dir=(0.7071067811865541, 0, 0.7071067811865411), z_dir=(0, -1, 0)), Plane(origin=(55, 8, 0), x_dir=(0.7071067811865553, 0, 0.7071067811865397), z_dir=(0, -1, 0)), Plane(origin=(79, 8, 0), x_dir=(0.7071067811865511, 0, 0.7071067811865439), z_dir=(0, -1, 0))) as fillet_1_2_piece_1:
        with BuildLine():
            CenterArc((FILLET_1_R, -FILLET_1_R), FILLET_1_R, 90, 90)
            Line((0, -FILLET_1_R), (0, 0))
            Line((0, 0), (FILLET_1_R, 0))
        make_face()
    extrude(amount=13, mode=Mode.SUBTRACT)
    with BuildSketch(Plane(origin=(10, -5, 20), x_dir=(0, 0, -1), z_dir=(0, 1, 0)), Plane(origin=(0, -5, 20), x_dir=(1, 0, 0), z_dir=(0, 1, 0)), Plane(origin=(0, -5, -20), x_dir=(0, 0, 1), z_dir=(0, 1, 0))) as fillet_1_2_piece_2:
        with BuildLine():
            CenterArc((FILLET_1_R, FILLET_1_R), FILLET_1_R, 180, 90)
            Line((0, FILLET_1_R), (0, 0))
            Line((0, 0), (FILLET_1_R, 0))
        make_face()
    extrude(amount=13, mode=Mode.SUBTRACT)


solid = part.part
